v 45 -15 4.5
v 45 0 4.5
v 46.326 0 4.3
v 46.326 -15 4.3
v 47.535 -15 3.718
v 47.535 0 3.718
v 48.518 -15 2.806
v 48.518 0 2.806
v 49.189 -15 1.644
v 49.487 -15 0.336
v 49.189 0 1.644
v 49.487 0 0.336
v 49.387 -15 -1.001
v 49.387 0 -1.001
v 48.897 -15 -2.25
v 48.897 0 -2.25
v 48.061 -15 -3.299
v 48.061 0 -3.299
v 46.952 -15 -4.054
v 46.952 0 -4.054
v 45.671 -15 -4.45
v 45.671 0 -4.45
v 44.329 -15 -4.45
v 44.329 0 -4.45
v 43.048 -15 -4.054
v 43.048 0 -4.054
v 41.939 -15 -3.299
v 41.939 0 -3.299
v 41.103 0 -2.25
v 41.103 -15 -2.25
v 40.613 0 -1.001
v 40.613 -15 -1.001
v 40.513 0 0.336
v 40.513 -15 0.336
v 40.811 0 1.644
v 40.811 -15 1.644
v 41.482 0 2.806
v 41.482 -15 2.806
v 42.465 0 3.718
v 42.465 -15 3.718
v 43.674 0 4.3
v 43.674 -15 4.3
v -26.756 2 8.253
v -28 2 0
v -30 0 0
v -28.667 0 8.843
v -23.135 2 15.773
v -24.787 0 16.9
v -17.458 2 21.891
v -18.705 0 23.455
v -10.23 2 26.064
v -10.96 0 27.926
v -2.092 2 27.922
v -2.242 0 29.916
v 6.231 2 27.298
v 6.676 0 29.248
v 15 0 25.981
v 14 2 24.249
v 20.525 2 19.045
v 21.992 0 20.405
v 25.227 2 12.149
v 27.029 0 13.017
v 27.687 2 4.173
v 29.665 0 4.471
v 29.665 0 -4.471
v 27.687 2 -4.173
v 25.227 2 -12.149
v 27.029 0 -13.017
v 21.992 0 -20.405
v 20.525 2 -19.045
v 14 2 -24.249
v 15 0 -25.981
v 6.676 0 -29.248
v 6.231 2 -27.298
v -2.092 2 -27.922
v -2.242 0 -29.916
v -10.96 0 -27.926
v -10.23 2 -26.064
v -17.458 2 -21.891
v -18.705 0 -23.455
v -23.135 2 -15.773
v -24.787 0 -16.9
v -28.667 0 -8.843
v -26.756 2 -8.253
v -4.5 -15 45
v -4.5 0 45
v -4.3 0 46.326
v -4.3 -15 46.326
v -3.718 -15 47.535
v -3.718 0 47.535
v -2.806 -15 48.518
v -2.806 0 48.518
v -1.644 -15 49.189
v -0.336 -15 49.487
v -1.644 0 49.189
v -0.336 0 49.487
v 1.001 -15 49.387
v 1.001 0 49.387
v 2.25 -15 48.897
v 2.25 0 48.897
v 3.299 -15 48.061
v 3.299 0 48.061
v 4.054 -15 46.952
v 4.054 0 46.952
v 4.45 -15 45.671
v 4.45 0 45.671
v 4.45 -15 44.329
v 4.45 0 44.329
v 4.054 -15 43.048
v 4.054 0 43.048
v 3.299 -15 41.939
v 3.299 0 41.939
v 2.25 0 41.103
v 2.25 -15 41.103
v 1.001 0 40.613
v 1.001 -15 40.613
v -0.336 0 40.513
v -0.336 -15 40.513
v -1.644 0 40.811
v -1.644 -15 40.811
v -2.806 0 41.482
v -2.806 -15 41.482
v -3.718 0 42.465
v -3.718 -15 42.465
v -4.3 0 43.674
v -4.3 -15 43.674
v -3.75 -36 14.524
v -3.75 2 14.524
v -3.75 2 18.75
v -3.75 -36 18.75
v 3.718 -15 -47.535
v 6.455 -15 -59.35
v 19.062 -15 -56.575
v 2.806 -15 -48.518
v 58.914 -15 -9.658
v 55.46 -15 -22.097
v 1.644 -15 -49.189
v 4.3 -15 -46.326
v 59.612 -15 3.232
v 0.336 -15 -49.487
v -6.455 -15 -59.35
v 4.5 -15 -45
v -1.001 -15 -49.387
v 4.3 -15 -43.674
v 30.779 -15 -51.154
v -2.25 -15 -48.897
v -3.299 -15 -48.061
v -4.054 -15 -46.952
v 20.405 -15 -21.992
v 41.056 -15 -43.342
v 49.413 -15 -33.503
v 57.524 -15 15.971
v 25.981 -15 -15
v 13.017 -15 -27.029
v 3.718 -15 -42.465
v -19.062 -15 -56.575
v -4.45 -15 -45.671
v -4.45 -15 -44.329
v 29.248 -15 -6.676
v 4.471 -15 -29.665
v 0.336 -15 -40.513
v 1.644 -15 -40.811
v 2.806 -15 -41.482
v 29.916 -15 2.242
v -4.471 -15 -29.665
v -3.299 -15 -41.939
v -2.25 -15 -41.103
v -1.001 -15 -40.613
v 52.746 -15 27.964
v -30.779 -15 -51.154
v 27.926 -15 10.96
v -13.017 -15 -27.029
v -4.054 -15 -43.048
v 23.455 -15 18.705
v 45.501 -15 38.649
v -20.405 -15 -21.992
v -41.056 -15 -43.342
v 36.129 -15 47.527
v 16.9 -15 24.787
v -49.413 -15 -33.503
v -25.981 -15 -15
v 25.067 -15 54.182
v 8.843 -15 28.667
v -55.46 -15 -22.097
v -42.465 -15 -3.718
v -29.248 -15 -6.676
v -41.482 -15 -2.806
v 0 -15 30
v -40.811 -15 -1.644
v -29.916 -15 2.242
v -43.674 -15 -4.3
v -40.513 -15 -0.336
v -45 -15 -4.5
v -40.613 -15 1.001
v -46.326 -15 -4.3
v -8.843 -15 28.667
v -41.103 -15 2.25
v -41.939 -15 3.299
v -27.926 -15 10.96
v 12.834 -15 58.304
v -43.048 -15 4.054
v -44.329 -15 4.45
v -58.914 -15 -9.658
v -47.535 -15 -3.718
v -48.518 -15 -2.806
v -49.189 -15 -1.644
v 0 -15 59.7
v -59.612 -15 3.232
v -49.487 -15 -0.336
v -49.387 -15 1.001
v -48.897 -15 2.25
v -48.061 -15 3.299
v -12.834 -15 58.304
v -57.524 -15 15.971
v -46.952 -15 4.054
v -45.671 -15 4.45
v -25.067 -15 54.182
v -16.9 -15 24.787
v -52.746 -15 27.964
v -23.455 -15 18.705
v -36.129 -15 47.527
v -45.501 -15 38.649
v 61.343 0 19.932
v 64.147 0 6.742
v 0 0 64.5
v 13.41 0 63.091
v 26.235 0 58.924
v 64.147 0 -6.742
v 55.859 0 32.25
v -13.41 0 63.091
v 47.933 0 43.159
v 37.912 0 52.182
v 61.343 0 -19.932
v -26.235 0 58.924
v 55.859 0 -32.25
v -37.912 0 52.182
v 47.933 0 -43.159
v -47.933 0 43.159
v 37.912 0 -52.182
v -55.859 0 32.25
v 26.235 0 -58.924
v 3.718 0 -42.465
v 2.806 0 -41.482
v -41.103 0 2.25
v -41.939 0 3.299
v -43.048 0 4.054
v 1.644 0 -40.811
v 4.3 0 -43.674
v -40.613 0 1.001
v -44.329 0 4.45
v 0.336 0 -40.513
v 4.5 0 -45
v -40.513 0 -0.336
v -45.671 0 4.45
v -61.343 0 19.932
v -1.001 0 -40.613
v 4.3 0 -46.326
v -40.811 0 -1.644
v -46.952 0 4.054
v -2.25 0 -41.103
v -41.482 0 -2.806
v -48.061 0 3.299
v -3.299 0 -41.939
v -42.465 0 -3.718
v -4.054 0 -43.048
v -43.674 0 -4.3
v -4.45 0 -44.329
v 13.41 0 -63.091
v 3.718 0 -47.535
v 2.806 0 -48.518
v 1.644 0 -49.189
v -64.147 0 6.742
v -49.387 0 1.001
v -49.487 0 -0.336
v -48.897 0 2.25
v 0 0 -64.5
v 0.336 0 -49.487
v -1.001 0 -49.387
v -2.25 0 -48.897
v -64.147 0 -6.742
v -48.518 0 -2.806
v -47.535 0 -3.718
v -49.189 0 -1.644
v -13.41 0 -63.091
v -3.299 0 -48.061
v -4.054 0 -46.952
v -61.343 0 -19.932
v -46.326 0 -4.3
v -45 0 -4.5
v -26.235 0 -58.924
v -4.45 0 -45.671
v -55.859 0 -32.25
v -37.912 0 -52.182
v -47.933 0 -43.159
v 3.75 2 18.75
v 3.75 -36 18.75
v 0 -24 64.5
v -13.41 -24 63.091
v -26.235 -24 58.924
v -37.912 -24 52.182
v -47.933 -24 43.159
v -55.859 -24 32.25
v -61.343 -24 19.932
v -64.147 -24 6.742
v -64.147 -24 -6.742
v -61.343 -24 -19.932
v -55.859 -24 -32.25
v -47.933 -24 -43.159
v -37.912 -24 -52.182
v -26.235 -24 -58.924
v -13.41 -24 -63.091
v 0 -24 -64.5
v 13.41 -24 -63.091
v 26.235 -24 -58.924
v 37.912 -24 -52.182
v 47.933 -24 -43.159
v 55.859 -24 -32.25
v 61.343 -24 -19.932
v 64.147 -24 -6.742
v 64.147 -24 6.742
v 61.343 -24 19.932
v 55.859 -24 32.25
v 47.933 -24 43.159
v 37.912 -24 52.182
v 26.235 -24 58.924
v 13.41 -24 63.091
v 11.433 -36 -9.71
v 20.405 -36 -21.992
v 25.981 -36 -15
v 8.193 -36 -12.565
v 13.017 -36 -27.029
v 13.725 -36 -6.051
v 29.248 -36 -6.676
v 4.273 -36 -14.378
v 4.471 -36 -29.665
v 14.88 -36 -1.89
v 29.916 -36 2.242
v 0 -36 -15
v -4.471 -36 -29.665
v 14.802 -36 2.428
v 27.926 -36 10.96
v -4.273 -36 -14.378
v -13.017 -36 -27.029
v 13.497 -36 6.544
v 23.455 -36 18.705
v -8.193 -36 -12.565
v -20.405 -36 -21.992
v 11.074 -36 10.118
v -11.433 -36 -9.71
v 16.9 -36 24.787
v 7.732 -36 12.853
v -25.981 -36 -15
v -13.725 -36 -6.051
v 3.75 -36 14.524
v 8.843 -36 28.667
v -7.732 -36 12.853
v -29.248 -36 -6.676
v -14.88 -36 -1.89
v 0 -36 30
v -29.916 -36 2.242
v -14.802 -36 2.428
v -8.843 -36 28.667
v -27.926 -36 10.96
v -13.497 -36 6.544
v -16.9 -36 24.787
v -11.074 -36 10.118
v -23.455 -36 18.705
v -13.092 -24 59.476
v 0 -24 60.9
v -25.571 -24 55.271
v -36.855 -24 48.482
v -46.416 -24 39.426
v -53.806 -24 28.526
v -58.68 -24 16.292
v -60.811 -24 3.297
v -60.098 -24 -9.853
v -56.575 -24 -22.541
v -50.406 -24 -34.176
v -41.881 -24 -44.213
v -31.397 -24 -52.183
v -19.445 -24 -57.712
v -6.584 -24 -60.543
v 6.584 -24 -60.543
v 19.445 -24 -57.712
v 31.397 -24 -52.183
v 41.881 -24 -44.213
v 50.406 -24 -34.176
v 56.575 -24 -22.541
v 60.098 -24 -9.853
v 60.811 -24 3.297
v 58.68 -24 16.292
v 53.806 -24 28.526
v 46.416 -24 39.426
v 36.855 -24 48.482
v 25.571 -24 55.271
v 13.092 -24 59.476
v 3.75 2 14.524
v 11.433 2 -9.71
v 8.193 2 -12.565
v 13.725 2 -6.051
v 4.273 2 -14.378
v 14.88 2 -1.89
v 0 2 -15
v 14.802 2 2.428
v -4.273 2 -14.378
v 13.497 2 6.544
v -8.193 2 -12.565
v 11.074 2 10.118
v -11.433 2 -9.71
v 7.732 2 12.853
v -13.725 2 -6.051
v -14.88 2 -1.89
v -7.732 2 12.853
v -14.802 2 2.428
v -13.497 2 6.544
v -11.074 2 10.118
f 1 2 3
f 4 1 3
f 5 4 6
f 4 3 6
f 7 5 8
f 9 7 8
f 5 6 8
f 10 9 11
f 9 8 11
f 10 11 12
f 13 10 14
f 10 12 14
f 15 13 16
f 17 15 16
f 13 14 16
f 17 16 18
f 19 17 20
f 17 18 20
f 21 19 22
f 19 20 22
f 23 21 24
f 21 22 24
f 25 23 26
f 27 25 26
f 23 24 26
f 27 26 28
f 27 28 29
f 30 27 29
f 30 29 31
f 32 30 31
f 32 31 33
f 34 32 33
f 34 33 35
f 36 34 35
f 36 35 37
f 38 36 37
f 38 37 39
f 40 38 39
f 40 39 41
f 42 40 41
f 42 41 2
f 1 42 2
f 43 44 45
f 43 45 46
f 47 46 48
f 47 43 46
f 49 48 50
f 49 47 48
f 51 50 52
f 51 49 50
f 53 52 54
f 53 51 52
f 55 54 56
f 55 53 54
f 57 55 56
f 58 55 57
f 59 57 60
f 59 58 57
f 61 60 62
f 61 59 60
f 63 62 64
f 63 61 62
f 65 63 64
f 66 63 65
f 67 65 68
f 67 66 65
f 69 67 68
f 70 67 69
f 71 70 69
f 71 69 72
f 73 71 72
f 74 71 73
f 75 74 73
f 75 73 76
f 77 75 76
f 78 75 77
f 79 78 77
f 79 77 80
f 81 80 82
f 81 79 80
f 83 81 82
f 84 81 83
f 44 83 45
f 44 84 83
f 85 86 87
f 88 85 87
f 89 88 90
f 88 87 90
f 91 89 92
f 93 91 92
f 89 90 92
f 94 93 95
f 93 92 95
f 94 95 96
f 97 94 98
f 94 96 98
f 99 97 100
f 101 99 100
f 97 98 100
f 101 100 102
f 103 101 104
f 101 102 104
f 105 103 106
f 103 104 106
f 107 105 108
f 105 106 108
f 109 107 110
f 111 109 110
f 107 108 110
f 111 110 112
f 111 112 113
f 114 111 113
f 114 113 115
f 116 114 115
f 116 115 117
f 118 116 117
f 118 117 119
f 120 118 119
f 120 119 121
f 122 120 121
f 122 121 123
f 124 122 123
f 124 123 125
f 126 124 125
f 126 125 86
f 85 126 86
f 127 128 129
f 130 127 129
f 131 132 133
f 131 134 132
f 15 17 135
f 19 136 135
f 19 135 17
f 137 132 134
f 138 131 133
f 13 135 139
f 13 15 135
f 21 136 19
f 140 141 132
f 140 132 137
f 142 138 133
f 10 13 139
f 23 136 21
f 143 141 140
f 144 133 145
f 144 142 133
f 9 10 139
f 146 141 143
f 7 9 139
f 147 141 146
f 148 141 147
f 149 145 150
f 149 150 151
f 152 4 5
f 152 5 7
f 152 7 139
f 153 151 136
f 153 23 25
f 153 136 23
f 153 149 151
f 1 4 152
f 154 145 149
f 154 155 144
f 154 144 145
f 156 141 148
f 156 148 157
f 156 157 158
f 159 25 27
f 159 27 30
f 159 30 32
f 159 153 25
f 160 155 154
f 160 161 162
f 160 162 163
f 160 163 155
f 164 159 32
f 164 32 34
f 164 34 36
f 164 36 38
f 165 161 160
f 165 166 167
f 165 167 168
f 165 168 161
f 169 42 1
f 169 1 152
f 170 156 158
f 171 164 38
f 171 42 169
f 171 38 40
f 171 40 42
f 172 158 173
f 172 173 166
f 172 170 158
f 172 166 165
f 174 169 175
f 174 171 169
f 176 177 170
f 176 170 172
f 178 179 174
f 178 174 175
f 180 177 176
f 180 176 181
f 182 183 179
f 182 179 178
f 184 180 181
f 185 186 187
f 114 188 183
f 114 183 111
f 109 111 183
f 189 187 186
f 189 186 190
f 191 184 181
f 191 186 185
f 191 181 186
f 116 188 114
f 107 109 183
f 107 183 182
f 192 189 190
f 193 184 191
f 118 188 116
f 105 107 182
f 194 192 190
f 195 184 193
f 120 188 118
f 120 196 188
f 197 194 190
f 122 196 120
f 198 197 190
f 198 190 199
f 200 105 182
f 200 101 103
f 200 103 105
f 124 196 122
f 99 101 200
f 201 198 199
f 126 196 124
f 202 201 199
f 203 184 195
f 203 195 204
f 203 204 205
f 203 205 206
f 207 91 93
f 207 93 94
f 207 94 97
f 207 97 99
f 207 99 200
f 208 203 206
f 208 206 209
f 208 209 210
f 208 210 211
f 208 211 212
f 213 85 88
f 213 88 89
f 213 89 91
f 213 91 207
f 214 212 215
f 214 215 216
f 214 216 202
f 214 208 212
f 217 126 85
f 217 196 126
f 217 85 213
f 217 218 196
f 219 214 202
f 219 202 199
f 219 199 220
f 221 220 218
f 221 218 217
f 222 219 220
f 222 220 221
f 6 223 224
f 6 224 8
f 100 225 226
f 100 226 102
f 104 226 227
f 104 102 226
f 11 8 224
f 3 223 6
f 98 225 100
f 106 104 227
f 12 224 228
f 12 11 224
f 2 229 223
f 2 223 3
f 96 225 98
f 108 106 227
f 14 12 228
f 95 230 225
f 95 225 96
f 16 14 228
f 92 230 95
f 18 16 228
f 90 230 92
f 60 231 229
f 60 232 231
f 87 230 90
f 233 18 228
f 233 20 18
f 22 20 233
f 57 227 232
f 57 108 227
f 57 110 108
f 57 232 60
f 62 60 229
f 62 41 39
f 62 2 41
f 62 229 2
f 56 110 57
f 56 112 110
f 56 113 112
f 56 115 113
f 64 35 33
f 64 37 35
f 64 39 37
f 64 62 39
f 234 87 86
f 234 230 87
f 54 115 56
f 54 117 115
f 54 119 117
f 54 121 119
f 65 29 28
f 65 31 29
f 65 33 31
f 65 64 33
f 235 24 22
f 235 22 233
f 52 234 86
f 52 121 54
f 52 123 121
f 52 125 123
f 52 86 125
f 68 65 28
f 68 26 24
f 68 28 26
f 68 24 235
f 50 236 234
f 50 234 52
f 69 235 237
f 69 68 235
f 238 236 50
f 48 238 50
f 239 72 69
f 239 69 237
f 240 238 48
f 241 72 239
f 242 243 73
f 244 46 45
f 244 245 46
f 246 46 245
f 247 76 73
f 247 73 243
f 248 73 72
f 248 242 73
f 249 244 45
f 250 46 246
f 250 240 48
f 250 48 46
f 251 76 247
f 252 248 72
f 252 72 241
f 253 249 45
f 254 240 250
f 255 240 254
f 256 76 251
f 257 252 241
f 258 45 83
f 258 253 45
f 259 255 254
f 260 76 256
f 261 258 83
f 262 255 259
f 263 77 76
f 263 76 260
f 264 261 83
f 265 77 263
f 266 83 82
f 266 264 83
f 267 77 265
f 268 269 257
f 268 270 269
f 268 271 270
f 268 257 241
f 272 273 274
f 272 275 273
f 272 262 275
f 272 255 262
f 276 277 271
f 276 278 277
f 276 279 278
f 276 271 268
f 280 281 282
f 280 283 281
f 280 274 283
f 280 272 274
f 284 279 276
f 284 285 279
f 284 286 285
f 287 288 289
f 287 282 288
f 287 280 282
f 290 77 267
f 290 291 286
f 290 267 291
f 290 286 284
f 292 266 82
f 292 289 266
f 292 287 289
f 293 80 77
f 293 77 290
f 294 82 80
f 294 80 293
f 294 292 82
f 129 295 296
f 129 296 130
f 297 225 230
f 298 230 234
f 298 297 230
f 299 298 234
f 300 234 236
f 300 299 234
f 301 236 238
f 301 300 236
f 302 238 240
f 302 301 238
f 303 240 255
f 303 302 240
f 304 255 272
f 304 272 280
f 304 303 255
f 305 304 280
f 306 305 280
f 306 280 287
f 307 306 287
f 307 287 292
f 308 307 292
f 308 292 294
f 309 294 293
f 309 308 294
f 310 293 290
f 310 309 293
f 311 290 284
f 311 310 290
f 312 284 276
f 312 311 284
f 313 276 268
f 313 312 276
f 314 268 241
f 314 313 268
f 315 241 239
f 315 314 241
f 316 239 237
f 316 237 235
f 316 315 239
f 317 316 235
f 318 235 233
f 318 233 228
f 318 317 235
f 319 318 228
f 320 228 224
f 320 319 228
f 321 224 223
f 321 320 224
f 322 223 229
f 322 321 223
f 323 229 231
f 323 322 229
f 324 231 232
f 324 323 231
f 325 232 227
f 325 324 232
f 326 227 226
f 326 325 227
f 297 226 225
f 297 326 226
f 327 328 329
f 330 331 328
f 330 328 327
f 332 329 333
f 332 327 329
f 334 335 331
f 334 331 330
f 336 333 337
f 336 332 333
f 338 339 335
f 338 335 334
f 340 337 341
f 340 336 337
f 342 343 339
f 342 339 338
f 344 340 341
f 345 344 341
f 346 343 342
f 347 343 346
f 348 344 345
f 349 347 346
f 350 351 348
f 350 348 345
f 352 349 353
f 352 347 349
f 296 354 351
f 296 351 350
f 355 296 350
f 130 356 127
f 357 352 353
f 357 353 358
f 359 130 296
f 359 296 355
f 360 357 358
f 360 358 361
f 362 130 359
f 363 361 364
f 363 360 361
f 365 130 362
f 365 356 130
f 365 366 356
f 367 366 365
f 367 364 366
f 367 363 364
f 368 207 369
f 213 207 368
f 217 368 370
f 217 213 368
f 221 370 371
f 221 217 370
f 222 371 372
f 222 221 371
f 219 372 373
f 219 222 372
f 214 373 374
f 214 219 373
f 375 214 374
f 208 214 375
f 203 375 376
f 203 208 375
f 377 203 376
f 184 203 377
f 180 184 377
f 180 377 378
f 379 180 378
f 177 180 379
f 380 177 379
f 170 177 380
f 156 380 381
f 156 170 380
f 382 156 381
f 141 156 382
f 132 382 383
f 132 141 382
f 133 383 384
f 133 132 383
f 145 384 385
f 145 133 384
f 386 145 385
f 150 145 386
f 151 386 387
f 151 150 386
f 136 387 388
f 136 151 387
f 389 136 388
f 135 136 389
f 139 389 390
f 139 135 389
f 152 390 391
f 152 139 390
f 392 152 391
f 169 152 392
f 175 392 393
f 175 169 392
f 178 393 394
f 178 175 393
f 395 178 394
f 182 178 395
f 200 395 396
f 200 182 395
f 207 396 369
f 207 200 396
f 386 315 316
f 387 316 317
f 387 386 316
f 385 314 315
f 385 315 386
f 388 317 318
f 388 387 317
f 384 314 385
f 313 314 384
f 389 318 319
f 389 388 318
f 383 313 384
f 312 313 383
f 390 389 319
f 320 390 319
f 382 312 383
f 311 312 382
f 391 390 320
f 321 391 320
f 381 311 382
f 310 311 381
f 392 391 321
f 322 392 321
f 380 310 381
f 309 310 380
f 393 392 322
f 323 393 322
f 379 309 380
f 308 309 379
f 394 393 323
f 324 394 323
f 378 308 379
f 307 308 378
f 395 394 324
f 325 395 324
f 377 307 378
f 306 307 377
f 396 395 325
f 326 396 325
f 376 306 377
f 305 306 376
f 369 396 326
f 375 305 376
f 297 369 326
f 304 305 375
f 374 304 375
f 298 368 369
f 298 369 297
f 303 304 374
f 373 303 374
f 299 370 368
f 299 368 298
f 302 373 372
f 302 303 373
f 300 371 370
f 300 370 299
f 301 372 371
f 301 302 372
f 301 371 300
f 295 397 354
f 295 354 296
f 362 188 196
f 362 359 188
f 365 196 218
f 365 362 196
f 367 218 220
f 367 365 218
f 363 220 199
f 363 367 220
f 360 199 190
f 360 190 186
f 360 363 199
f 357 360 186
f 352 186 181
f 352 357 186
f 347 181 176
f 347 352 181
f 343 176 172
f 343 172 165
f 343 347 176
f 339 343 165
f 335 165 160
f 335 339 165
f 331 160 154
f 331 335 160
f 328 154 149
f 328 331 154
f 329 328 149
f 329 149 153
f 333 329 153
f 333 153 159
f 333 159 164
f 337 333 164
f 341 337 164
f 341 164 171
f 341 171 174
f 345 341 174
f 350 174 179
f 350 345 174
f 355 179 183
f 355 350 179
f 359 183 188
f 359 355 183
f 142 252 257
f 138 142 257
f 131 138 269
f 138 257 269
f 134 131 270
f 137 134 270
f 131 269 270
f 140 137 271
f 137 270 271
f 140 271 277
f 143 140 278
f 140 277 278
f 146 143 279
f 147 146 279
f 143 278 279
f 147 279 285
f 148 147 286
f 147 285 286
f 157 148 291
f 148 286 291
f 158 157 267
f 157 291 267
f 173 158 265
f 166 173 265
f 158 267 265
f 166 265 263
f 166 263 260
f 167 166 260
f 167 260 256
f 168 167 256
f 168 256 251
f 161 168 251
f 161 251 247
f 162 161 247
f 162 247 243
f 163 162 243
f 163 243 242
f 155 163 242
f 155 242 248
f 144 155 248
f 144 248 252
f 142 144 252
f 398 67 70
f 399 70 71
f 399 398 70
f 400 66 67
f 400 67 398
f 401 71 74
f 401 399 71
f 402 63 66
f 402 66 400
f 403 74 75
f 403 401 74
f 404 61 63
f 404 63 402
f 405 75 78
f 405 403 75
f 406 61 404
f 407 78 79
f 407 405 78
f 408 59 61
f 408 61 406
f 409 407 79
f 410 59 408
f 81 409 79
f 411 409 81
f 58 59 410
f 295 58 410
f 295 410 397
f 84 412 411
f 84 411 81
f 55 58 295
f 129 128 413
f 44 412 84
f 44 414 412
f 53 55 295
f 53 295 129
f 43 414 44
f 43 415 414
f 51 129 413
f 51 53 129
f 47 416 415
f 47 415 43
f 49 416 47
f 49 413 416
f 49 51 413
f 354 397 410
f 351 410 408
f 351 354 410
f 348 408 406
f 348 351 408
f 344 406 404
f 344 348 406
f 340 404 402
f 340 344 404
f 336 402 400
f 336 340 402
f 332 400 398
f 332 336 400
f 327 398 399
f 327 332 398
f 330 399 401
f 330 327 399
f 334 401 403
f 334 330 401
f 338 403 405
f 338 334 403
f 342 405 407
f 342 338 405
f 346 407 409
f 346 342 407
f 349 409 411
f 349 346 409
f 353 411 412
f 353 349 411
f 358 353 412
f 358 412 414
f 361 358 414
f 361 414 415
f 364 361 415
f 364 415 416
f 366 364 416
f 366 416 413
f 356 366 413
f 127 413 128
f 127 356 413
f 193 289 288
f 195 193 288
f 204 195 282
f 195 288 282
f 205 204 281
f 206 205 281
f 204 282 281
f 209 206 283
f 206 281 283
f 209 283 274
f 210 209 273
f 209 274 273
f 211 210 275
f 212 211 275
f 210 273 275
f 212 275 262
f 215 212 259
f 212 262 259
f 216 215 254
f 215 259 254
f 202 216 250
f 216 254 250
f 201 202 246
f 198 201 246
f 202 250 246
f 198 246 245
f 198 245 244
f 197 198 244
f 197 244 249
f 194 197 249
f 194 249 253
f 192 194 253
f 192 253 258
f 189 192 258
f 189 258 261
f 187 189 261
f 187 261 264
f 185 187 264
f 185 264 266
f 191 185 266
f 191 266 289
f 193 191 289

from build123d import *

# Parameters (mm, degrees)
F2_R     = 30
F2_R_2   = 15
F3_DEPTH = 2
F4_SIZE  = 1.99999
F5_R     = 4.5
F6_DEPTH = 25
F7_COUNT = 4
F8_W     = 7.5
F8_H     = 7.5
F9_DEPTH = 50


# Not quite as in the source:
# - a fillet or chamfer is up to 0.001 mm smaller than in the source, because OpenCascade refuses the exact size


with BuildPart() as f1:
    # F0 (on Right) → F1 (revolve)
    with BuildSketch(Plane.YZ):
        Polygon((0, 15), (0, 64.5), (-24, 64.5), (-24, 60.9), (-15, 59.7), (-15, 30), (-36, 30), (-36, 15), align=None)
    revolve(axis=Axis((0, -28.2661654055, 0), (0, -1, 0)))

    # F2 (on face) → F3 (join)
    with BuildSketch(Plane(origin=(0, 0, 0), x_dir=(-1, 0, 0), z_dir=(0, 1, 0))):
        Circle(F2_R)
        Circle(F2_R_2, mode=Mode.SUBTRACT)
    extrude(amount=F3_DEPTH)

    # F4 (size 2 in the source; OpenCascade refuses exactly that, so slightly less here)
    f4_edges = [f1.edges().sort_by_distance(p)[0] for p in [
        (30, 2, 0),
    ]]
    chamfer(f4_edges, length=F4_SIZE)

    # F5 (on face) → F6 (cut)
    with BuildSketch(Plane(origin=(0, 0, 0), x_dir=(-1, 0, 0), z_dir=(0, 1, 0))):
        with Locations((0, 45)):
            Circle(F5_R)
    f6 = extrude(amount=-F6_DEPTH, mode=Mode.SUBTRACT)

    # F7: F6 ×4 about axis
    f7_axis = Axis((0, 2, 0), (0, 1, 0))
    for i in range(1, F7_COUNT):
        add(f6.rotate(f7_axis, i * 360 / F7_COUNT), mode=Mode.SUBTRACT)

    # F8 (on face) → F9 (cut)
    with BuildSketch(Plane(origin=(0, 2, 0), x_dir=(-1, 0, 0), z_dir=(0, 1, 0))):
        with Locations((0, 15)):
            Rectangle(F8_W, F8_H)
    extrude(amount=-F9_DEPTH, mode=Mode.SUBTRACT)


solid = f1.part
